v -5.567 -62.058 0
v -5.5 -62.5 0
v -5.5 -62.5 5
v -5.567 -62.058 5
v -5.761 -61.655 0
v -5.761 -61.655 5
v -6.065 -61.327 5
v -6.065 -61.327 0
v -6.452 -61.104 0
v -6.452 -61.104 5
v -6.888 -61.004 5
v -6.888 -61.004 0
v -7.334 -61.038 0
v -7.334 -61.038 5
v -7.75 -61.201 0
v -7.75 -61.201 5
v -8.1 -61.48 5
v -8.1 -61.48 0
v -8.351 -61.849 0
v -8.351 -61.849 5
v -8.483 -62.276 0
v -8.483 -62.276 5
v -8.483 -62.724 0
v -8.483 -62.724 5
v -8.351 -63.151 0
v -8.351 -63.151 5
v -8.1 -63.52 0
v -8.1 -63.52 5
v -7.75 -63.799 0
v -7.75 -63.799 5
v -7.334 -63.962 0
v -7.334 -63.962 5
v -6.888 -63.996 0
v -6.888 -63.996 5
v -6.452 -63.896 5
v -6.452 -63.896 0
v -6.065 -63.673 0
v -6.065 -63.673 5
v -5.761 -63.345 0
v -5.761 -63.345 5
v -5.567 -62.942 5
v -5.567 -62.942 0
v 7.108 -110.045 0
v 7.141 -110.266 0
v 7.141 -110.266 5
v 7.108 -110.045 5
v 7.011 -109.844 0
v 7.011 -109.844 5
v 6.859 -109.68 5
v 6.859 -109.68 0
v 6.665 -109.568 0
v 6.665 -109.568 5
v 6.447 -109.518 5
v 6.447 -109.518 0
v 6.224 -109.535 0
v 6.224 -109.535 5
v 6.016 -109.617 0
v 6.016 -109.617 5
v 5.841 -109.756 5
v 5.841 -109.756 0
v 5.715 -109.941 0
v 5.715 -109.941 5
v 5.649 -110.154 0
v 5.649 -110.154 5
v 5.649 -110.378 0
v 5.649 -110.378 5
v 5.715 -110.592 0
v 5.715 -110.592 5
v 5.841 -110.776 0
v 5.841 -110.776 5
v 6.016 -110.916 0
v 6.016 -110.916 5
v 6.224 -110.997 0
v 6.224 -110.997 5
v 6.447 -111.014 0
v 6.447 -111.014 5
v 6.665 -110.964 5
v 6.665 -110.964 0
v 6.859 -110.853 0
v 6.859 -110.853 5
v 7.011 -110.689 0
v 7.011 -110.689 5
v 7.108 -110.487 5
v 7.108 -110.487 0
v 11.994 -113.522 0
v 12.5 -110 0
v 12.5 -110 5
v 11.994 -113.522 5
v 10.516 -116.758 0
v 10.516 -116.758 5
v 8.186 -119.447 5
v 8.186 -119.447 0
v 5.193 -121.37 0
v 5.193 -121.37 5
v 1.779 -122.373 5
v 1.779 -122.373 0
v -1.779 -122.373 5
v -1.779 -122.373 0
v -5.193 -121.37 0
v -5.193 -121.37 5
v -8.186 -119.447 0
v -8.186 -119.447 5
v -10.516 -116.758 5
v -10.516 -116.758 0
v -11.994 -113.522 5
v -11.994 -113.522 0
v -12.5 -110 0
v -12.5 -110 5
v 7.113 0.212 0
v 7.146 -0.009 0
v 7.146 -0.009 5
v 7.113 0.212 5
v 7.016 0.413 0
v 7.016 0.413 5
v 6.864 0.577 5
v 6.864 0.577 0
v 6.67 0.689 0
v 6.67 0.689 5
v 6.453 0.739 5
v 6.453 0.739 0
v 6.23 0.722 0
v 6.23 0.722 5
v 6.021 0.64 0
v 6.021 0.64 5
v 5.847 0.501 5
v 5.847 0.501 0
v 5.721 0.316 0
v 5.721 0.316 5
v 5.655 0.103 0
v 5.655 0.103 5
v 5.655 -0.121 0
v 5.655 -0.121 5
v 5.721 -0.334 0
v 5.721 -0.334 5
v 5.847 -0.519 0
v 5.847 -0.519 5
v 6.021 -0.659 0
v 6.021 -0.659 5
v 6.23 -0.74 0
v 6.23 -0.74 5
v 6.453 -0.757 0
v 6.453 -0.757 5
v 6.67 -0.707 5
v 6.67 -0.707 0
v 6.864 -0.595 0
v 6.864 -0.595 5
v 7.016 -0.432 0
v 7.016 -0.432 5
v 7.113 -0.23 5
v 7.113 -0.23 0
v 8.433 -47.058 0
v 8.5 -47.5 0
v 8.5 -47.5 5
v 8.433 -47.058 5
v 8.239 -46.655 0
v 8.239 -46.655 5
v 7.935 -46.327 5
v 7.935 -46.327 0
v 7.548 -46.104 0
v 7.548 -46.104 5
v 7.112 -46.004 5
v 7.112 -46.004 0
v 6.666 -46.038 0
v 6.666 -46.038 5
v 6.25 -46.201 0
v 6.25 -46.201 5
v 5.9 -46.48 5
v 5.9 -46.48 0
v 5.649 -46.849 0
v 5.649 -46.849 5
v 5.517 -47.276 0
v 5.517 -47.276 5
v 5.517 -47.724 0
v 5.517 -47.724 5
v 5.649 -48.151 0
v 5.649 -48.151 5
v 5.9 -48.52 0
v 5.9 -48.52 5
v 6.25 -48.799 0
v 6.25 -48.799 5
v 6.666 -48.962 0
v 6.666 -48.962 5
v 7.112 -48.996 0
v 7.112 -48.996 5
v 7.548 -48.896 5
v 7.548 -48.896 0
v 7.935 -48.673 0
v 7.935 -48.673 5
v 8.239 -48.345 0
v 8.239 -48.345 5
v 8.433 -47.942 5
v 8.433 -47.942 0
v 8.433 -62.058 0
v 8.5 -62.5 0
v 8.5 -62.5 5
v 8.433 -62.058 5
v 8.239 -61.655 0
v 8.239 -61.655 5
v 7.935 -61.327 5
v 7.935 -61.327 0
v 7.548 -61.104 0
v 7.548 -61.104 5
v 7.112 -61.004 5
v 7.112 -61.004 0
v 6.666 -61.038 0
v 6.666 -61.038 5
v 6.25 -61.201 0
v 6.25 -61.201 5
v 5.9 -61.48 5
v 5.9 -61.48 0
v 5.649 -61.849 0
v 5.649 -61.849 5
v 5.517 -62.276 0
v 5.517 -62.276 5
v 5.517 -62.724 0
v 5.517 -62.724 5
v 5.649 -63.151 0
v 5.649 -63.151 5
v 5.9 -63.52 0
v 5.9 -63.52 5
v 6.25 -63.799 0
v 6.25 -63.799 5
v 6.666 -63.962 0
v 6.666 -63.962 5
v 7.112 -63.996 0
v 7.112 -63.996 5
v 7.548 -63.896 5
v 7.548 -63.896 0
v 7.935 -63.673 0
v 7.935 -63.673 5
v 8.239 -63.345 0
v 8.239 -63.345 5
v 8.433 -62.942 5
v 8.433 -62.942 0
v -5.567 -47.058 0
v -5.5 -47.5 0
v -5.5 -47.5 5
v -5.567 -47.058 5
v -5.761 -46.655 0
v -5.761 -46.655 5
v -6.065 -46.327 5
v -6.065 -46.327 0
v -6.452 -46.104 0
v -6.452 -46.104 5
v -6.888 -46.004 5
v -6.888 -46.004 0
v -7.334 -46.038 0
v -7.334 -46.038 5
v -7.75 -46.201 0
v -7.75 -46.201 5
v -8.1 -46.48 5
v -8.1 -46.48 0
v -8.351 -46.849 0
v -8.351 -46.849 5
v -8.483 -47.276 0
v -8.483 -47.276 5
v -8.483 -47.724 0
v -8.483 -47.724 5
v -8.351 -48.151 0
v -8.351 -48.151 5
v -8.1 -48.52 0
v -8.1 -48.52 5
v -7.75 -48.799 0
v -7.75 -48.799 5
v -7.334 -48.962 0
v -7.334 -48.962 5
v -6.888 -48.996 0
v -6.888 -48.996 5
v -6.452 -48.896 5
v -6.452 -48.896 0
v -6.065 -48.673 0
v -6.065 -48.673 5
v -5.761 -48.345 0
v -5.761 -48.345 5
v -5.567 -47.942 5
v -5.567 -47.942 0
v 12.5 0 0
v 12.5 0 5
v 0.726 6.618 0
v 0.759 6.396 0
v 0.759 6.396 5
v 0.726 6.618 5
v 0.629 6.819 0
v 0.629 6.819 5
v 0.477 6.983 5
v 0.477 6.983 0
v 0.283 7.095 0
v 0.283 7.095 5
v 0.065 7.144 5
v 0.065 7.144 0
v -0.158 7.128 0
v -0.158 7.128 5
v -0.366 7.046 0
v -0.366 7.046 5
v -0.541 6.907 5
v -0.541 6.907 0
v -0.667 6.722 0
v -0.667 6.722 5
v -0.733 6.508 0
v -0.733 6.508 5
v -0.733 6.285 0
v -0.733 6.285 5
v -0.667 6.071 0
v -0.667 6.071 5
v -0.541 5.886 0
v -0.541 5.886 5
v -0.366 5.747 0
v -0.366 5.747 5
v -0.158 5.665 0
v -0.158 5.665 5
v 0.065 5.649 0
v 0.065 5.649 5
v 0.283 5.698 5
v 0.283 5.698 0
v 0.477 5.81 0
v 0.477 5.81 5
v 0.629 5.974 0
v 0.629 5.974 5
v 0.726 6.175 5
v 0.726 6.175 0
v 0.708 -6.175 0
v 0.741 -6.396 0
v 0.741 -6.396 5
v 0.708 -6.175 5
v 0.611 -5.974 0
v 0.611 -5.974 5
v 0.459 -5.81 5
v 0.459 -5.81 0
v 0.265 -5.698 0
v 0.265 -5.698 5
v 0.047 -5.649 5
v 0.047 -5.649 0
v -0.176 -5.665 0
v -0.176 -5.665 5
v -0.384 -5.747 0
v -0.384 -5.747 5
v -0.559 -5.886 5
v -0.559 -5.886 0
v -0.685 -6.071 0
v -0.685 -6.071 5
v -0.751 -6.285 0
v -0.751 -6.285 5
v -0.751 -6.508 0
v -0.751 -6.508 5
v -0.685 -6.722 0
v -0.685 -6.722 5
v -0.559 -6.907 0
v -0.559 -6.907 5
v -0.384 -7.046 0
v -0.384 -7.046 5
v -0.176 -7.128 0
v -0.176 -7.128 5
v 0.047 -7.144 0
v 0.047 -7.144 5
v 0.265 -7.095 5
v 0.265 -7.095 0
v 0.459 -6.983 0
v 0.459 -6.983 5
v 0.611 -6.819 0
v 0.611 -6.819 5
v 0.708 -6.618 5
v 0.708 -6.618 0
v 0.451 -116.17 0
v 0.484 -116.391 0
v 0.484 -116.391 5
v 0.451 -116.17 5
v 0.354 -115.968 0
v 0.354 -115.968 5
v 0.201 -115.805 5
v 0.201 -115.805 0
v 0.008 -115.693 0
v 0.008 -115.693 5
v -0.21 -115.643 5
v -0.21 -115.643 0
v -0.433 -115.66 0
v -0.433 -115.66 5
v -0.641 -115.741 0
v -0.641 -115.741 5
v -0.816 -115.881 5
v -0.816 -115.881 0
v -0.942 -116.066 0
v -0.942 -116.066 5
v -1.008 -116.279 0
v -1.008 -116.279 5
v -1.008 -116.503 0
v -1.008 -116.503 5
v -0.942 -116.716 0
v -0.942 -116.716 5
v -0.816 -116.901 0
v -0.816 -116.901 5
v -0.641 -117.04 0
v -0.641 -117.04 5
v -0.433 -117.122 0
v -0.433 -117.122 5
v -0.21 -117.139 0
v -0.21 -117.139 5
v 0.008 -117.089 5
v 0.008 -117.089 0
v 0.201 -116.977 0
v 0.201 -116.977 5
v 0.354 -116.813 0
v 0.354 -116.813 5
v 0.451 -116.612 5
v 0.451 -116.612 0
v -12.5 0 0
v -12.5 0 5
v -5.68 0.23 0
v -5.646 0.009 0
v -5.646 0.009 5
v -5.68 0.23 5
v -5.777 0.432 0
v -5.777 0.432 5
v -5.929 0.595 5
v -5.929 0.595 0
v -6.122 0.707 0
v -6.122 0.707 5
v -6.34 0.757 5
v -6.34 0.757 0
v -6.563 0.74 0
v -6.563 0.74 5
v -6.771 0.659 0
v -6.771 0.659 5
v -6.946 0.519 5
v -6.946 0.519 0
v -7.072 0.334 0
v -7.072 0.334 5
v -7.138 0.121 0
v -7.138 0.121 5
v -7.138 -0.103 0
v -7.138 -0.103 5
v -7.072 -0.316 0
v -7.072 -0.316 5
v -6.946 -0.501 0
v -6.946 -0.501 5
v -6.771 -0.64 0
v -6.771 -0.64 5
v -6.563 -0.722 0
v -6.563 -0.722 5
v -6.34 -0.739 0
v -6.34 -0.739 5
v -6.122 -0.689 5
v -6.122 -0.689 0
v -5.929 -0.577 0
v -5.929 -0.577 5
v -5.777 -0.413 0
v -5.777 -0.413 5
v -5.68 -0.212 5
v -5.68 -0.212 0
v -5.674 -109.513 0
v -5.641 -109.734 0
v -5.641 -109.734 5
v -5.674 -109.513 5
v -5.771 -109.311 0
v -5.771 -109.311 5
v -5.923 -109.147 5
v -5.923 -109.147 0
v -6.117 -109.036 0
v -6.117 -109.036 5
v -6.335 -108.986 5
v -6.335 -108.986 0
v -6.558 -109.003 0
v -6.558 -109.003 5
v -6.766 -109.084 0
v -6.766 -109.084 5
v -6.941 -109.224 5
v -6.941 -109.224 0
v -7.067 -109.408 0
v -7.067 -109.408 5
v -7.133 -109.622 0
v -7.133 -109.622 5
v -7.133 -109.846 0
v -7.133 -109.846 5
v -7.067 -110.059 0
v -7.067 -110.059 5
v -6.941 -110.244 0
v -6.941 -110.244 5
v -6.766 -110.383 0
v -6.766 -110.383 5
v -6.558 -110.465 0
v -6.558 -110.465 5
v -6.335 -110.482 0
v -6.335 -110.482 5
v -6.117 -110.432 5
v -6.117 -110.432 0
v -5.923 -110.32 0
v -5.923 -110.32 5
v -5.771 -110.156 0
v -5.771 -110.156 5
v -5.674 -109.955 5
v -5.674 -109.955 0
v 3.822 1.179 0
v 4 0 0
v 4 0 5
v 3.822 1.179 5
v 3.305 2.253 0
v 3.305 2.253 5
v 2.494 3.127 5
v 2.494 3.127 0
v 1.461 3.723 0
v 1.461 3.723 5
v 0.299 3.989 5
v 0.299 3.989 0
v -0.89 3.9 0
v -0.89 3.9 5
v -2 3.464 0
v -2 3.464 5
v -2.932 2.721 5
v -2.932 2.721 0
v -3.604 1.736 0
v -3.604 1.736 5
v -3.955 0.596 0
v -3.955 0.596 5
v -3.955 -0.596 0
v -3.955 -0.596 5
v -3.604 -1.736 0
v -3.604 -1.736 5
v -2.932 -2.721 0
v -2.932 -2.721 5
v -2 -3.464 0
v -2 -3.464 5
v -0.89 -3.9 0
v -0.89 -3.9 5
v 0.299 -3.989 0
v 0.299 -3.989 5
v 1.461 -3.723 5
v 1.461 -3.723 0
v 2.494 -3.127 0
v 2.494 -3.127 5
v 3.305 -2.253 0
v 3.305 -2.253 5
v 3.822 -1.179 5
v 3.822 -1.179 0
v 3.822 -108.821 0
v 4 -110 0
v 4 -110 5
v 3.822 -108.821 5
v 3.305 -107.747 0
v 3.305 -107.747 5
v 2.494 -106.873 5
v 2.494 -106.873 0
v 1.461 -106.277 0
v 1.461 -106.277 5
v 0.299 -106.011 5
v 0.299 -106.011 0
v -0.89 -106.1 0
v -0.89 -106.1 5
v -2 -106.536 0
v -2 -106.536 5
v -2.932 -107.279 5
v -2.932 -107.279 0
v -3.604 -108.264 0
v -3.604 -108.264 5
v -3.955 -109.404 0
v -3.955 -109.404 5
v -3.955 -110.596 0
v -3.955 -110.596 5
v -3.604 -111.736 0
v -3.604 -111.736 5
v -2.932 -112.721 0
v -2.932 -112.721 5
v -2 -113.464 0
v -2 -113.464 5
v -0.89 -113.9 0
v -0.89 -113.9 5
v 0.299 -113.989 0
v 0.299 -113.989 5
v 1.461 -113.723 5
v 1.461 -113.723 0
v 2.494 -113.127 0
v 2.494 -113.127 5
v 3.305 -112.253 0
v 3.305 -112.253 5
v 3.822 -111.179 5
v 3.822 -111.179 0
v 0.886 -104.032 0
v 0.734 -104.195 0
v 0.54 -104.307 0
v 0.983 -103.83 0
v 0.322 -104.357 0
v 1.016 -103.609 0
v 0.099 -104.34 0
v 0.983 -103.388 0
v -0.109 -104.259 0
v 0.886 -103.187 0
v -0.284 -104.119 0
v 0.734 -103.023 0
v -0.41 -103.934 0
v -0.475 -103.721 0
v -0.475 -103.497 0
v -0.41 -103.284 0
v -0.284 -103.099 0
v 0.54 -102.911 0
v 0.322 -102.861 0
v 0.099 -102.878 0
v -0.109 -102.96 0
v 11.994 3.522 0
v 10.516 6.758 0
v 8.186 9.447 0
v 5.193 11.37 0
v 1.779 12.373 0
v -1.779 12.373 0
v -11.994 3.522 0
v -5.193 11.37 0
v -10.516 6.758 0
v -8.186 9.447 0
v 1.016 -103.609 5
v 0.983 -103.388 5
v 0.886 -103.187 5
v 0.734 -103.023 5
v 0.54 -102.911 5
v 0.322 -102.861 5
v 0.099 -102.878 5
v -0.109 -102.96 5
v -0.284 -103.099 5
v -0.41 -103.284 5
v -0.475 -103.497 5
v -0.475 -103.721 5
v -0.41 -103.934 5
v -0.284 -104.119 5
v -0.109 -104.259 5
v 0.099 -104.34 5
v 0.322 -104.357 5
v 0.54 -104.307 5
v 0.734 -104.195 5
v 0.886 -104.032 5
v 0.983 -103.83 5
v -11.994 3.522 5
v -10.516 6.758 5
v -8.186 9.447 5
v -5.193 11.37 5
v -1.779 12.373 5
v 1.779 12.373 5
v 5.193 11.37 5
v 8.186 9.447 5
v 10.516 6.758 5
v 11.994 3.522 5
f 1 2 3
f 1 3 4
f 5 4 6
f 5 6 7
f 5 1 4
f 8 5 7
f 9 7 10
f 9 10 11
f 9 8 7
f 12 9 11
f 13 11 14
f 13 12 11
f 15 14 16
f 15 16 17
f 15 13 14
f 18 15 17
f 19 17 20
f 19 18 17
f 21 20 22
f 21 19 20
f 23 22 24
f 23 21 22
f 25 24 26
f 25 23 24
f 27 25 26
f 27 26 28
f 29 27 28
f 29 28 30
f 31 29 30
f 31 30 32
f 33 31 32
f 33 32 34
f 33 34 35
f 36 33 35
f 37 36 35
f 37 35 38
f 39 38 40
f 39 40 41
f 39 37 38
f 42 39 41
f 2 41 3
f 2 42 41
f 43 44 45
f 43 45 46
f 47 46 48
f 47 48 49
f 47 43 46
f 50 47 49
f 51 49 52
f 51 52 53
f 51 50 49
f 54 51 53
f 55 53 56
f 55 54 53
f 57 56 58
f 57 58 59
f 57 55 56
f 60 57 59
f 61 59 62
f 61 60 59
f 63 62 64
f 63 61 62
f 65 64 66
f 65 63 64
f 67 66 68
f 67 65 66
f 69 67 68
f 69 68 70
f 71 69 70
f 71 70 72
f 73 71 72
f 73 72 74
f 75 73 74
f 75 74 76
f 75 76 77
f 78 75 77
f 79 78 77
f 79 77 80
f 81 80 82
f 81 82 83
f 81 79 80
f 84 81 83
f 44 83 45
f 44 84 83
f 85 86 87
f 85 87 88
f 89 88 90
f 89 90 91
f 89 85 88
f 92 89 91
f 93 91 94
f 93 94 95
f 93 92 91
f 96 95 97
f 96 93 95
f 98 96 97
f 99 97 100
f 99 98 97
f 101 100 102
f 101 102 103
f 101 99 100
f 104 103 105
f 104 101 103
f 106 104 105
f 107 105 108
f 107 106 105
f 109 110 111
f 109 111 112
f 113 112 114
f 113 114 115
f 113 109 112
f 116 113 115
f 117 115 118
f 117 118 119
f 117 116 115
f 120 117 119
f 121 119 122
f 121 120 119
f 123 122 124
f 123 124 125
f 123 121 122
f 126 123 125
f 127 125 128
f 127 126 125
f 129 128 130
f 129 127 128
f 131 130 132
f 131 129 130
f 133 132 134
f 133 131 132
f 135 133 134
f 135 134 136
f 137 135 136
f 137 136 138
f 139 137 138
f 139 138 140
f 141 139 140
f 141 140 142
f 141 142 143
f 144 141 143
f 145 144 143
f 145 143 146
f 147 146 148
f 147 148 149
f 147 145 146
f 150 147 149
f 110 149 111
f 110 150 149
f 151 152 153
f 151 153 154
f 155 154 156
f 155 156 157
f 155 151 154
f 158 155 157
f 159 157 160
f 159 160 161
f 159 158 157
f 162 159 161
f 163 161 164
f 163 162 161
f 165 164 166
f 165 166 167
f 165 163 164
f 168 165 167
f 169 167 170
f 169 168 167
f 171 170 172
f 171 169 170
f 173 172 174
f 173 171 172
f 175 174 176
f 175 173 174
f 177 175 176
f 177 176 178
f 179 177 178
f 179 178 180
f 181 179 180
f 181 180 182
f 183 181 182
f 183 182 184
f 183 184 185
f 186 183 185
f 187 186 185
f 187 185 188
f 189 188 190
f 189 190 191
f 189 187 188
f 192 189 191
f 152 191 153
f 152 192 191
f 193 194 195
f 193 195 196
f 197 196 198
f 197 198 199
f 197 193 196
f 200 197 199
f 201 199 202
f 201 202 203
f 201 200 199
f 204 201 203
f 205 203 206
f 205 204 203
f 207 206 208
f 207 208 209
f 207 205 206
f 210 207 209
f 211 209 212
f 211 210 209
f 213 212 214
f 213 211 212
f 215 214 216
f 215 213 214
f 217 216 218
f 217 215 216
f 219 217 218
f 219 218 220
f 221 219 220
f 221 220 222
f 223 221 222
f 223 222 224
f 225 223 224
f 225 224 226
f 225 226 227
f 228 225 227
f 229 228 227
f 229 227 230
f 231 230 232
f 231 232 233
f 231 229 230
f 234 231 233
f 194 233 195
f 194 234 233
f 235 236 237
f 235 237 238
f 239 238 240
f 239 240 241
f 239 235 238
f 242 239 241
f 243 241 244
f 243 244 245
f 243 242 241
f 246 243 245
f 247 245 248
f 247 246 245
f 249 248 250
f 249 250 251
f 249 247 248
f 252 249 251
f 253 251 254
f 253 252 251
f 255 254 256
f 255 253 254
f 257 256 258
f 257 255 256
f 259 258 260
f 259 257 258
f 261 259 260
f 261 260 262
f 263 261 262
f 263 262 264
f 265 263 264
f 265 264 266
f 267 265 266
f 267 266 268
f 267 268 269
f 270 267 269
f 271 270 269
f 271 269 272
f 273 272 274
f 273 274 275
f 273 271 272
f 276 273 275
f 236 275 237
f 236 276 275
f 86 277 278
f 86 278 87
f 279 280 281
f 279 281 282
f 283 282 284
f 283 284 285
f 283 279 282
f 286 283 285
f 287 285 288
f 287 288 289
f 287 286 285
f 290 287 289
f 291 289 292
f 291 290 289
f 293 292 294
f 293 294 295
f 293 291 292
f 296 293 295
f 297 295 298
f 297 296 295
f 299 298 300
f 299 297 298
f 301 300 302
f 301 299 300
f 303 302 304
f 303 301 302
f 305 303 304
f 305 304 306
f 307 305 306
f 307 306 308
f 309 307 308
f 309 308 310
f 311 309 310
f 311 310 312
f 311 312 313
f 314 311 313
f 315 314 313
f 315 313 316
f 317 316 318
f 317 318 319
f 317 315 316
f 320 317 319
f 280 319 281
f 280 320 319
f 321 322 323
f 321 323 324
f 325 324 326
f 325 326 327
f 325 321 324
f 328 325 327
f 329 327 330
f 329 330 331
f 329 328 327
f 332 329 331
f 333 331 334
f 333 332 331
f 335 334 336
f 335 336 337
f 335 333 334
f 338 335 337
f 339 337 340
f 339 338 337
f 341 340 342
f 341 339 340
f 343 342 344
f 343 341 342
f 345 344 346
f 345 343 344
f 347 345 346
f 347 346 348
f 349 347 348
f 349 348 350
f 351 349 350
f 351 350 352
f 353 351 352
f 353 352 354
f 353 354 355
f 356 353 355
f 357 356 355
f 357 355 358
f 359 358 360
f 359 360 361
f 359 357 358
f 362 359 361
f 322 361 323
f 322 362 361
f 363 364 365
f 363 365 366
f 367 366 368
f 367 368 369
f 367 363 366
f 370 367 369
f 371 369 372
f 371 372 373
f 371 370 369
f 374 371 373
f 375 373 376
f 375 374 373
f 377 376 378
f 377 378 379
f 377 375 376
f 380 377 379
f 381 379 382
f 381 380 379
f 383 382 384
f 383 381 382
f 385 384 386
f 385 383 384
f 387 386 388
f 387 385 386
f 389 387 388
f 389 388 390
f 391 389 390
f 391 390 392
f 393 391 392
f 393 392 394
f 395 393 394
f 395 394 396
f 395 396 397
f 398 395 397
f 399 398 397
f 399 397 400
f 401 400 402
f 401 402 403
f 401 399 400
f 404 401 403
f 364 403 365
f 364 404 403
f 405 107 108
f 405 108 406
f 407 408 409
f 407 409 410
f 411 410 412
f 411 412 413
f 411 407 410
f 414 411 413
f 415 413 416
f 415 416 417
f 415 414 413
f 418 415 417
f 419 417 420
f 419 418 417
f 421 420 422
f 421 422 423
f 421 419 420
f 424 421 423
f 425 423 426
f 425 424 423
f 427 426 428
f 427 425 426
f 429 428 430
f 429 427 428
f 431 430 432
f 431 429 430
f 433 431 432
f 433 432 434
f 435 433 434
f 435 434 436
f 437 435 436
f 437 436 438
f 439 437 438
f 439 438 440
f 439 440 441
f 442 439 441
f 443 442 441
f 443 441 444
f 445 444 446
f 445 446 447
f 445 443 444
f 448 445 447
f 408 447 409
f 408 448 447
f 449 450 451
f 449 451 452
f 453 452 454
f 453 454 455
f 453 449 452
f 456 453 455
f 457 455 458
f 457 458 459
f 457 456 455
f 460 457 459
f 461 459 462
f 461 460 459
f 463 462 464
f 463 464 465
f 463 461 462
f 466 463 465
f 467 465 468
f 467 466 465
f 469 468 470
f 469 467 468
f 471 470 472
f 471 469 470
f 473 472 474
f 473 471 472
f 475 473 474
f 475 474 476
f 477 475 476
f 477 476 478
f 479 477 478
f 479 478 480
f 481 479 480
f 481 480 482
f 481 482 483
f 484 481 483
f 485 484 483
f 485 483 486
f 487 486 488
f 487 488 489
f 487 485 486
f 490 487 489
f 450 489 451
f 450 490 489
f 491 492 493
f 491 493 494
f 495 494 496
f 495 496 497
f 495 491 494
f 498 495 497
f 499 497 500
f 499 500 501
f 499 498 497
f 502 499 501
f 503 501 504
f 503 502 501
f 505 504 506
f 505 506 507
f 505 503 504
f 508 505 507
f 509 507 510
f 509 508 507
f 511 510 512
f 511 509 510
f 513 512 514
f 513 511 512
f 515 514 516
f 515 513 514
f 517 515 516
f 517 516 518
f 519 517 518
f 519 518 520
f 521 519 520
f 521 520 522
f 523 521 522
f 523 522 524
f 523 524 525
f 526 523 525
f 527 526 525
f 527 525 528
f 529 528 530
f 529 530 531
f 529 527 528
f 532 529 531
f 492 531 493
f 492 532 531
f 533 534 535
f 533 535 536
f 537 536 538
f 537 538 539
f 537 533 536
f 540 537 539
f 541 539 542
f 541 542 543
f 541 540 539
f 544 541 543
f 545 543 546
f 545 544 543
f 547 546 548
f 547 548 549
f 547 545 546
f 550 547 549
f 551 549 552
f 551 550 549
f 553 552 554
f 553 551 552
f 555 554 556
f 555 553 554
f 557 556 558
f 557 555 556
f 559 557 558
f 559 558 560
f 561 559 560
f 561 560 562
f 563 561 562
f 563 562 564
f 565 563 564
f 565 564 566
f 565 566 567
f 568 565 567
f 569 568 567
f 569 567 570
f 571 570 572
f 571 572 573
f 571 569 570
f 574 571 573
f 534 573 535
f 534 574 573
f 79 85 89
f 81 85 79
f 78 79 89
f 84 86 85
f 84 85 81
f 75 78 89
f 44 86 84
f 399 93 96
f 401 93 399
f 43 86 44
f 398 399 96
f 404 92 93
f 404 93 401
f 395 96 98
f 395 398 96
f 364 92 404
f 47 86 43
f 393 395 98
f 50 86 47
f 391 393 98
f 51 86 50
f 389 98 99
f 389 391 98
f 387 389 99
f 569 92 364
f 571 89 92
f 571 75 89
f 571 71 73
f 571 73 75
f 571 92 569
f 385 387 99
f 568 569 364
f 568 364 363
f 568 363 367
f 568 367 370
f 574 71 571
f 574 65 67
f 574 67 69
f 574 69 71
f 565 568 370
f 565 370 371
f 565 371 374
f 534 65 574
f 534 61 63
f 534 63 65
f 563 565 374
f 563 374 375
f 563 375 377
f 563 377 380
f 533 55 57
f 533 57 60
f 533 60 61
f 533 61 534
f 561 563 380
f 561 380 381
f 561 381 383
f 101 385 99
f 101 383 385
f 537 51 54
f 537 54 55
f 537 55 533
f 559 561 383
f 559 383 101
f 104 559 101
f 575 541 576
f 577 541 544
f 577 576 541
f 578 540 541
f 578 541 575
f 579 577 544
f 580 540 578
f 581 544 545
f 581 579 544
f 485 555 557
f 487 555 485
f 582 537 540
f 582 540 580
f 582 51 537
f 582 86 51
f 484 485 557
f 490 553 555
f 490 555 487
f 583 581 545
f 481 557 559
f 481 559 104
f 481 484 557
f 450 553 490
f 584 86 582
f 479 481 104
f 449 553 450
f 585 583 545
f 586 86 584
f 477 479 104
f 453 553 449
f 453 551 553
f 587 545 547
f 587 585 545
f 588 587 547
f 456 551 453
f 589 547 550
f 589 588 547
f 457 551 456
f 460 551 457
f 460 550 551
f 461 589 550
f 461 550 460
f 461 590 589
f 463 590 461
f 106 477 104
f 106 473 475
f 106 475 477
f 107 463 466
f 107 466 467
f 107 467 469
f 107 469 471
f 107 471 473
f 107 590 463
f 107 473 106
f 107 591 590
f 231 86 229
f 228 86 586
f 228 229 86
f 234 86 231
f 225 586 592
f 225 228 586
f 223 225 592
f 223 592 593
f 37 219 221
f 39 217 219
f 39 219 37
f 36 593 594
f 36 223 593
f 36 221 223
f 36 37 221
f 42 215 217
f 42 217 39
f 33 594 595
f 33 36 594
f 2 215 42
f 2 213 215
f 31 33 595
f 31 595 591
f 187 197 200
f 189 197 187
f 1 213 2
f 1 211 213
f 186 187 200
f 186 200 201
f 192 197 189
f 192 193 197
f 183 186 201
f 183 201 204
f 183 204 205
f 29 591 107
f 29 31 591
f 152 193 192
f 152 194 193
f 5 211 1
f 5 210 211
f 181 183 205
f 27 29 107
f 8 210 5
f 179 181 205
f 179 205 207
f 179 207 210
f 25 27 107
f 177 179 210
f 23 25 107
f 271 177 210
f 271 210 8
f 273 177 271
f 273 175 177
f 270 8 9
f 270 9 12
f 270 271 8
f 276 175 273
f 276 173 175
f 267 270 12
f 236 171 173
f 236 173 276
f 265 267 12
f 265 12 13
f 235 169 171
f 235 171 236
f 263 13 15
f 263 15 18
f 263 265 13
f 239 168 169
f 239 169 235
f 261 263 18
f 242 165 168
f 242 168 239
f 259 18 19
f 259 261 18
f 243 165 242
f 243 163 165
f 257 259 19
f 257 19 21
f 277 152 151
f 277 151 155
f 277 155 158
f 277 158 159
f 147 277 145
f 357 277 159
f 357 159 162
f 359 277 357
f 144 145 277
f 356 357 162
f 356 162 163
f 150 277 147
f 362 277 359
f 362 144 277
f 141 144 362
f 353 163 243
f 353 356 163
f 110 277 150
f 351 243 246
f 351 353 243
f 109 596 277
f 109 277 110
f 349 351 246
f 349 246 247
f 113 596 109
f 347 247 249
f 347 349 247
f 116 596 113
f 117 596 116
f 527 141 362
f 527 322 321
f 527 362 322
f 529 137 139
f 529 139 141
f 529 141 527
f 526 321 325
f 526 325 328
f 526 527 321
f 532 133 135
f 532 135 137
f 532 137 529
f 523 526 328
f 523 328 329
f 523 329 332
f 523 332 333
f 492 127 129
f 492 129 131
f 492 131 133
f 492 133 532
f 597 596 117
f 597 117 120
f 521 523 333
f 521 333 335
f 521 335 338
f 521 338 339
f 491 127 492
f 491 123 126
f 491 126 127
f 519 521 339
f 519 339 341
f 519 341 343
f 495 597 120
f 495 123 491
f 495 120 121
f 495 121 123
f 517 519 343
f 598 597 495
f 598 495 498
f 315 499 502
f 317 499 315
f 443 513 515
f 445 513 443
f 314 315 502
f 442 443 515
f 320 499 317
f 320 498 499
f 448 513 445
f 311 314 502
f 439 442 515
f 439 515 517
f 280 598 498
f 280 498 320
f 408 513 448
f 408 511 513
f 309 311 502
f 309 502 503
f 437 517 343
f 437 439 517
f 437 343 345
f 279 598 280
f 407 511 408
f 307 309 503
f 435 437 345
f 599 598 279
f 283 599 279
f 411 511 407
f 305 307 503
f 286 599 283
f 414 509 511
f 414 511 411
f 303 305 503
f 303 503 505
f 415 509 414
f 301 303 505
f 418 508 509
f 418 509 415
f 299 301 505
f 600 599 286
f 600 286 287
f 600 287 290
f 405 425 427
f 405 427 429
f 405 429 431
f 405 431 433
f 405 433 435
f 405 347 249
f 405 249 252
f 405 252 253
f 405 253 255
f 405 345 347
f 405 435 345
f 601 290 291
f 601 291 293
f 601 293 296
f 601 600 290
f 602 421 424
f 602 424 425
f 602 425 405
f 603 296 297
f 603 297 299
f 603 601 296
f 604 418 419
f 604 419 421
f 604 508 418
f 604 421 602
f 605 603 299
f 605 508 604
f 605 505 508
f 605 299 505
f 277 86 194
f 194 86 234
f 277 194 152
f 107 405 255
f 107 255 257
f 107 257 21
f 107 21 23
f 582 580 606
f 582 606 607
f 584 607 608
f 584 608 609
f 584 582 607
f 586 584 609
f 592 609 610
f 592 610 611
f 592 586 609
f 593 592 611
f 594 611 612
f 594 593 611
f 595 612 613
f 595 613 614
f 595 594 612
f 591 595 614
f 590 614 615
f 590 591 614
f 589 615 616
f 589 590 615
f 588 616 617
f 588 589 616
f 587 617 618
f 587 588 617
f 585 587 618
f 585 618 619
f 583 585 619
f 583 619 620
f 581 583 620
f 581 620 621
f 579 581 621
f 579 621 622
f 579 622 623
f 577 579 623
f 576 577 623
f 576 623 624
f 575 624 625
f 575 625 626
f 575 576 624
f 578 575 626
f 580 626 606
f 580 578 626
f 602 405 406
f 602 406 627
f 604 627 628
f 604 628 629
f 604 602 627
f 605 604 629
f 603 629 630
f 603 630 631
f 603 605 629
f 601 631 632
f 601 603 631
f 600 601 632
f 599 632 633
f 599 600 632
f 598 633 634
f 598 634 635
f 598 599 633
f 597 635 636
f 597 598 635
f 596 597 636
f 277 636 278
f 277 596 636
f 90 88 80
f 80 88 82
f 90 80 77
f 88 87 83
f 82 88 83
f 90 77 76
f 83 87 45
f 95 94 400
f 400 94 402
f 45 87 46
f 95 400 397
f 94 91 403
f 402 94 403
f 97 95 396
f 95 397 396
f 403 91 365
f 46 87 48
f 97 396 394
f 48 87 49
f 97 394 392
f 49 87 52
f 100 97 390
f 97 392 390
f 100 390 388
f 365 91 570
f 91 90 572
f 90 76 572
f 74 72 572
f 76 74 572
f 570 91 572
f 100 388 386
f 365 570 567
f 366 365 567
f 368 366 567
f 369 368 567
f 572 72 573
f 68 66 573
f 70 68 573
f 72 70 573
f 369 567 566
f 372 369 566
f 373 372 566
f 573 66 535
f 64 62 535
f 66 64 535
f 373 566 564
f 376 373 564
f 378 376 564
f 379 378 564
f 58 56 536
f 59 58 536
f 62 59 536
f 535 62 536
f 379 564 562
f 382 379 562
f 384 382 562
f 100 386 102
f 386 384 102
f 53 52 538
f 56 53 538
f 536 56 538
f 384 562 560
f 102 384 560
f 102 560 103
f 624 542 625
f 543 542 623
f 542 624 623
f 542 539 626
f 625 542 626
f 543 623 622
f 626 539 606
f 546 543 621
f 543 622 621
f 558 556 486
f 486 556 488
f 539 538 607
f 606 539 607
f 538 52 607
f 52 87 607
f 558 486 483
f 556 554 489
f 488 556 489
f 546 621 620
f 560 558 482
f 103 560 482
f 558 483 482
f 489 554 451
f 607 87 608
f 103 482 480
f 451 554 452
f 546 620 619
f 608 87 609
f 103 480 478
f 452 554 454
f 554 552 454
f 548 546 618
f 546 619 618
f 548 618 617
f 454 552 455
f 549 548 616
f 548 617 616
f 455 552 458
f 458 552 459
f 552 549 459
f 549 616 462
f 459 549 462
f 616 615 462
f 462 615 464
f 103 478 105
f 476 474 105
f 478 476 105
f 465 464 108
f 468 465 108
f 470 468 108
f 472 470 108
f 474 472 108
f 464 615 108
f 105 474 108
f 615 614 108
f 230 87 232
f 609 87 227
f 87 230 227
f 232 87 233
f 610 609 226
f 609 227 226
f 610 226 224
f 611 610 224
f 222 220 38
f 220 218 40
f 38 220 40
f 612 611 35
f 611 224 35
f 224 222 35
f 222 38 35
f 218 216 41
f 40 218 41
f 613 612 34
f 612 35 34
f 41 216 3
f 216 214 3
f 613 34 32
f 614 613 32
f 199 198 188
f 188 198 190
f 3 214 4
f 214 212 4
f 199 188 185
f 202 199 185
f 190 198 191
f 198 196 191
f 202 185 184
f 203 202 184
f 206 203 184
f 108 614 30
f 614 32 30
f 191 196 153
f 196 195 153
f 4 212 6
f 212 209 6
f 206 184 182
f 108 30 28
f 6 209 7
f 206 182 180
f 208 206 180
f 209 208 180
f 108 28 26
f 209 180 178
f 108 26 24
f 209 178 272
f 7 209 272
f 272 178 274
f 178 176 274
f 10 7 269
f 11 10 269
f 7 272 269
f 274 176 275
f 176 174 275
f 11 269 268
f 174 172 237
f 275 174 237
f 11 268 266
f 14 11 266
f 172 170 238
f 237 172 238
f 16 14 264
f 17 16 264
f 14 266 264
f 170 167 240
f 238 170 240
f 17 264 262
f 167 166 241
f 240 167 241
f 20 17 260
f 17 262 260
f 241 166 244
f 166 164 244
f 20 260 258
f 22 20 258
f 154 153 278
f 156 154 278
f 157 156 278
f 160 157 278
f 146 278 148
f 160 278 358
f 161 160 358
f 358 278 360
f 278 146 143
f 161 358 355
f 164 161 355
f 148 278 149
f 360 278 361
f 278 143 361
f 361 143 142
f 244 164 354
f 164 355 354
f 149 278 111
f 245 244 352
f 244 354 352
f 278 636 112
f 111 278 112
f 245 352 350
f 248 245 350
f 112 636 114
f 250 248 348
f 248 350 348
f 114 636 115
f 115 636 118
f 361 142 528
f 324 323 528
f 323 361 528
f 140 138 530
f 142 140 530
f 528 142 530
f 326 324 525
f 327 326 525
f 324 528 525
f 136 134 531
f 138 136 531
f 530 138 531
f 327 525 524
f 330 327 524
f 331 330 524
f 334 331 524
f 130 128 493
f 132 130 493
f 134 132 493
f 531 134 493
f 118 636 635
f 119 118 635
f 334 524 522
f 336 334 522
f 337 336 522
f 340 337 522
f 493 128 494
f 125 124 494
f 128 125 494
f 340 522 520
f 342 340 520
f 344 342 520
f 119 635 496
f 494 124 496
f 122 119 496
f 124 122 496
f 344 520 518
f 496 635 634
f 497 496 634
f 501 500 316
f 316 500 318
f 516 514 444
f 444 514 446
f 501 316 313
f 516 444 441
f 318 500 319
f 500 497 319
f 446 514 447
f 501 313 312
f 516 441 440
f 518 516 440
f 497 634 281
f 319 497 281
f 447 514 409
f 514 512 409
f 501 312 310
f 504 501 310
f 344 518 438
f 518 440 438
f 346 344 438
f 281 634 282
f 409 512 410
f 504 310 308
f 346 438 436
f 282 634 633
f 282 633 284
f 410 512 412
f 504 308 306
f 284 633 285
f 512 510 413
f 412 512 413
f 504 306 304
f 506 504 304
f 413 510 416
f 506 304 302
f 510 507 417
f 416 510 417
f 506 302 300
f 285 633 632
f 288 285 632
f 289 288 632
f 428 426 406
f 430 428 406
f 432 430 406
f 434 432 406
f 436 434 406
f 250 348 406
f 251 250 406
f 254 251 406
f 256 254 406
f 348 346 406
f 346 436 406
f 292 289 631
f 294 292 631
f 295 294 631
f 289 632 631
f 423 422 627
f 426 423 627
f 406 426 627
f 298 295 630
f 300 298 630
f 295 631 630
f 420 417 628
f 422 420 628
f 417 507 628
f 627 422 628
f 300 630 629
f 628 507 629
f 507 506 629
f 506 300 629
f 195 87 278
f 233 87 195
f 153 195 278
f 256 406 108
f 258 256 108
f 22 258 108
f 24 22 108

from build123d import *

# Parameters (mm, degrees)
SKETCH2_R           = 4
SKETCH2_R_2         = 1.5
SKETCH2_R_3         = 0.75
BOSS_EXTRUDE1_DEPTH = 5


with BuildPart() as part:
    # Sketch2 → Boss-Extrude1 (new body)
    with BuildSketch(Plane.XY):
        with BuildLine():
            Line((12.5, 0), (12.5, -110))
            ThreePointArc((12.5, -110), (0, -122.5), (-12.5, -110))
            Line((-12.5, -110), (-12.5, 0))
            ThreePointArc((-12.5, 0), (0, 12.5), (12.5, 0))
        make_face()
        Circle(SKETCH2_R, mode=Mode.SUBTRACT)
        with Locations((0, -110)):
            Circle(SKETCH2_R, mode=Mode.SUBTRACT)
        with Locations((7, -47.5)):
            Circle(SKETCH2_R_2, mode=Mode.SUBTRACT)
        with Locations((-7, -47.5)):
            Circle(SKETCH2_R_2, mode=Mode.SUBTRACT)
        with Locations((7, -62.5)):
            Circle(SKETCH2_R_2, mode=Mode.SUBTRACT)
        with Locations((-7, -62.5)):
            Circle(SKETCH2_R_2, mode=Mode.SUBTRACT)
        with Locations((6.390950113, -110.266167545)):
            Circle(SKETCH2_R_3, mode=Mode.SUBTRACT)
        with Locations((-0.266167545, -116.390950113)):
            Circle(SKETCH2_R_3, mode=Mode.SUBTRACT)
        with Locations((-6.390950113, -109.733832455)):
            Circle(SKETCH2_R_3, mode=Mode.SUBTRACT)
        with Locations((0.266167545, -103.609049887)):
            Circle(SKETCH2_R_3, mode=Mode.SUBTRACT)
        with Locations((-6.396483965, 0.009022015)):
            Circle(SKETCH2_R_3, mode=Mode.SUBTRACT)
        with Locations((0.009022015, 6.396483965)):
            Circle(SKETCH2_R_3, mode=Mode.SUBTRACT)
        with Locations((-0.009022015, -6.396483966)):
            Circle(SKETCH2_R_3, mode=Mode.SUBTRACT)
        with Locations((6.396483965, -0.009022016)):
            Circle(SKETCH2_R_3, mode=Mode.SUBTRACT)
    extrude(amount=BOSS_EXTRUDE1_DEPTH)


solid = part.part
